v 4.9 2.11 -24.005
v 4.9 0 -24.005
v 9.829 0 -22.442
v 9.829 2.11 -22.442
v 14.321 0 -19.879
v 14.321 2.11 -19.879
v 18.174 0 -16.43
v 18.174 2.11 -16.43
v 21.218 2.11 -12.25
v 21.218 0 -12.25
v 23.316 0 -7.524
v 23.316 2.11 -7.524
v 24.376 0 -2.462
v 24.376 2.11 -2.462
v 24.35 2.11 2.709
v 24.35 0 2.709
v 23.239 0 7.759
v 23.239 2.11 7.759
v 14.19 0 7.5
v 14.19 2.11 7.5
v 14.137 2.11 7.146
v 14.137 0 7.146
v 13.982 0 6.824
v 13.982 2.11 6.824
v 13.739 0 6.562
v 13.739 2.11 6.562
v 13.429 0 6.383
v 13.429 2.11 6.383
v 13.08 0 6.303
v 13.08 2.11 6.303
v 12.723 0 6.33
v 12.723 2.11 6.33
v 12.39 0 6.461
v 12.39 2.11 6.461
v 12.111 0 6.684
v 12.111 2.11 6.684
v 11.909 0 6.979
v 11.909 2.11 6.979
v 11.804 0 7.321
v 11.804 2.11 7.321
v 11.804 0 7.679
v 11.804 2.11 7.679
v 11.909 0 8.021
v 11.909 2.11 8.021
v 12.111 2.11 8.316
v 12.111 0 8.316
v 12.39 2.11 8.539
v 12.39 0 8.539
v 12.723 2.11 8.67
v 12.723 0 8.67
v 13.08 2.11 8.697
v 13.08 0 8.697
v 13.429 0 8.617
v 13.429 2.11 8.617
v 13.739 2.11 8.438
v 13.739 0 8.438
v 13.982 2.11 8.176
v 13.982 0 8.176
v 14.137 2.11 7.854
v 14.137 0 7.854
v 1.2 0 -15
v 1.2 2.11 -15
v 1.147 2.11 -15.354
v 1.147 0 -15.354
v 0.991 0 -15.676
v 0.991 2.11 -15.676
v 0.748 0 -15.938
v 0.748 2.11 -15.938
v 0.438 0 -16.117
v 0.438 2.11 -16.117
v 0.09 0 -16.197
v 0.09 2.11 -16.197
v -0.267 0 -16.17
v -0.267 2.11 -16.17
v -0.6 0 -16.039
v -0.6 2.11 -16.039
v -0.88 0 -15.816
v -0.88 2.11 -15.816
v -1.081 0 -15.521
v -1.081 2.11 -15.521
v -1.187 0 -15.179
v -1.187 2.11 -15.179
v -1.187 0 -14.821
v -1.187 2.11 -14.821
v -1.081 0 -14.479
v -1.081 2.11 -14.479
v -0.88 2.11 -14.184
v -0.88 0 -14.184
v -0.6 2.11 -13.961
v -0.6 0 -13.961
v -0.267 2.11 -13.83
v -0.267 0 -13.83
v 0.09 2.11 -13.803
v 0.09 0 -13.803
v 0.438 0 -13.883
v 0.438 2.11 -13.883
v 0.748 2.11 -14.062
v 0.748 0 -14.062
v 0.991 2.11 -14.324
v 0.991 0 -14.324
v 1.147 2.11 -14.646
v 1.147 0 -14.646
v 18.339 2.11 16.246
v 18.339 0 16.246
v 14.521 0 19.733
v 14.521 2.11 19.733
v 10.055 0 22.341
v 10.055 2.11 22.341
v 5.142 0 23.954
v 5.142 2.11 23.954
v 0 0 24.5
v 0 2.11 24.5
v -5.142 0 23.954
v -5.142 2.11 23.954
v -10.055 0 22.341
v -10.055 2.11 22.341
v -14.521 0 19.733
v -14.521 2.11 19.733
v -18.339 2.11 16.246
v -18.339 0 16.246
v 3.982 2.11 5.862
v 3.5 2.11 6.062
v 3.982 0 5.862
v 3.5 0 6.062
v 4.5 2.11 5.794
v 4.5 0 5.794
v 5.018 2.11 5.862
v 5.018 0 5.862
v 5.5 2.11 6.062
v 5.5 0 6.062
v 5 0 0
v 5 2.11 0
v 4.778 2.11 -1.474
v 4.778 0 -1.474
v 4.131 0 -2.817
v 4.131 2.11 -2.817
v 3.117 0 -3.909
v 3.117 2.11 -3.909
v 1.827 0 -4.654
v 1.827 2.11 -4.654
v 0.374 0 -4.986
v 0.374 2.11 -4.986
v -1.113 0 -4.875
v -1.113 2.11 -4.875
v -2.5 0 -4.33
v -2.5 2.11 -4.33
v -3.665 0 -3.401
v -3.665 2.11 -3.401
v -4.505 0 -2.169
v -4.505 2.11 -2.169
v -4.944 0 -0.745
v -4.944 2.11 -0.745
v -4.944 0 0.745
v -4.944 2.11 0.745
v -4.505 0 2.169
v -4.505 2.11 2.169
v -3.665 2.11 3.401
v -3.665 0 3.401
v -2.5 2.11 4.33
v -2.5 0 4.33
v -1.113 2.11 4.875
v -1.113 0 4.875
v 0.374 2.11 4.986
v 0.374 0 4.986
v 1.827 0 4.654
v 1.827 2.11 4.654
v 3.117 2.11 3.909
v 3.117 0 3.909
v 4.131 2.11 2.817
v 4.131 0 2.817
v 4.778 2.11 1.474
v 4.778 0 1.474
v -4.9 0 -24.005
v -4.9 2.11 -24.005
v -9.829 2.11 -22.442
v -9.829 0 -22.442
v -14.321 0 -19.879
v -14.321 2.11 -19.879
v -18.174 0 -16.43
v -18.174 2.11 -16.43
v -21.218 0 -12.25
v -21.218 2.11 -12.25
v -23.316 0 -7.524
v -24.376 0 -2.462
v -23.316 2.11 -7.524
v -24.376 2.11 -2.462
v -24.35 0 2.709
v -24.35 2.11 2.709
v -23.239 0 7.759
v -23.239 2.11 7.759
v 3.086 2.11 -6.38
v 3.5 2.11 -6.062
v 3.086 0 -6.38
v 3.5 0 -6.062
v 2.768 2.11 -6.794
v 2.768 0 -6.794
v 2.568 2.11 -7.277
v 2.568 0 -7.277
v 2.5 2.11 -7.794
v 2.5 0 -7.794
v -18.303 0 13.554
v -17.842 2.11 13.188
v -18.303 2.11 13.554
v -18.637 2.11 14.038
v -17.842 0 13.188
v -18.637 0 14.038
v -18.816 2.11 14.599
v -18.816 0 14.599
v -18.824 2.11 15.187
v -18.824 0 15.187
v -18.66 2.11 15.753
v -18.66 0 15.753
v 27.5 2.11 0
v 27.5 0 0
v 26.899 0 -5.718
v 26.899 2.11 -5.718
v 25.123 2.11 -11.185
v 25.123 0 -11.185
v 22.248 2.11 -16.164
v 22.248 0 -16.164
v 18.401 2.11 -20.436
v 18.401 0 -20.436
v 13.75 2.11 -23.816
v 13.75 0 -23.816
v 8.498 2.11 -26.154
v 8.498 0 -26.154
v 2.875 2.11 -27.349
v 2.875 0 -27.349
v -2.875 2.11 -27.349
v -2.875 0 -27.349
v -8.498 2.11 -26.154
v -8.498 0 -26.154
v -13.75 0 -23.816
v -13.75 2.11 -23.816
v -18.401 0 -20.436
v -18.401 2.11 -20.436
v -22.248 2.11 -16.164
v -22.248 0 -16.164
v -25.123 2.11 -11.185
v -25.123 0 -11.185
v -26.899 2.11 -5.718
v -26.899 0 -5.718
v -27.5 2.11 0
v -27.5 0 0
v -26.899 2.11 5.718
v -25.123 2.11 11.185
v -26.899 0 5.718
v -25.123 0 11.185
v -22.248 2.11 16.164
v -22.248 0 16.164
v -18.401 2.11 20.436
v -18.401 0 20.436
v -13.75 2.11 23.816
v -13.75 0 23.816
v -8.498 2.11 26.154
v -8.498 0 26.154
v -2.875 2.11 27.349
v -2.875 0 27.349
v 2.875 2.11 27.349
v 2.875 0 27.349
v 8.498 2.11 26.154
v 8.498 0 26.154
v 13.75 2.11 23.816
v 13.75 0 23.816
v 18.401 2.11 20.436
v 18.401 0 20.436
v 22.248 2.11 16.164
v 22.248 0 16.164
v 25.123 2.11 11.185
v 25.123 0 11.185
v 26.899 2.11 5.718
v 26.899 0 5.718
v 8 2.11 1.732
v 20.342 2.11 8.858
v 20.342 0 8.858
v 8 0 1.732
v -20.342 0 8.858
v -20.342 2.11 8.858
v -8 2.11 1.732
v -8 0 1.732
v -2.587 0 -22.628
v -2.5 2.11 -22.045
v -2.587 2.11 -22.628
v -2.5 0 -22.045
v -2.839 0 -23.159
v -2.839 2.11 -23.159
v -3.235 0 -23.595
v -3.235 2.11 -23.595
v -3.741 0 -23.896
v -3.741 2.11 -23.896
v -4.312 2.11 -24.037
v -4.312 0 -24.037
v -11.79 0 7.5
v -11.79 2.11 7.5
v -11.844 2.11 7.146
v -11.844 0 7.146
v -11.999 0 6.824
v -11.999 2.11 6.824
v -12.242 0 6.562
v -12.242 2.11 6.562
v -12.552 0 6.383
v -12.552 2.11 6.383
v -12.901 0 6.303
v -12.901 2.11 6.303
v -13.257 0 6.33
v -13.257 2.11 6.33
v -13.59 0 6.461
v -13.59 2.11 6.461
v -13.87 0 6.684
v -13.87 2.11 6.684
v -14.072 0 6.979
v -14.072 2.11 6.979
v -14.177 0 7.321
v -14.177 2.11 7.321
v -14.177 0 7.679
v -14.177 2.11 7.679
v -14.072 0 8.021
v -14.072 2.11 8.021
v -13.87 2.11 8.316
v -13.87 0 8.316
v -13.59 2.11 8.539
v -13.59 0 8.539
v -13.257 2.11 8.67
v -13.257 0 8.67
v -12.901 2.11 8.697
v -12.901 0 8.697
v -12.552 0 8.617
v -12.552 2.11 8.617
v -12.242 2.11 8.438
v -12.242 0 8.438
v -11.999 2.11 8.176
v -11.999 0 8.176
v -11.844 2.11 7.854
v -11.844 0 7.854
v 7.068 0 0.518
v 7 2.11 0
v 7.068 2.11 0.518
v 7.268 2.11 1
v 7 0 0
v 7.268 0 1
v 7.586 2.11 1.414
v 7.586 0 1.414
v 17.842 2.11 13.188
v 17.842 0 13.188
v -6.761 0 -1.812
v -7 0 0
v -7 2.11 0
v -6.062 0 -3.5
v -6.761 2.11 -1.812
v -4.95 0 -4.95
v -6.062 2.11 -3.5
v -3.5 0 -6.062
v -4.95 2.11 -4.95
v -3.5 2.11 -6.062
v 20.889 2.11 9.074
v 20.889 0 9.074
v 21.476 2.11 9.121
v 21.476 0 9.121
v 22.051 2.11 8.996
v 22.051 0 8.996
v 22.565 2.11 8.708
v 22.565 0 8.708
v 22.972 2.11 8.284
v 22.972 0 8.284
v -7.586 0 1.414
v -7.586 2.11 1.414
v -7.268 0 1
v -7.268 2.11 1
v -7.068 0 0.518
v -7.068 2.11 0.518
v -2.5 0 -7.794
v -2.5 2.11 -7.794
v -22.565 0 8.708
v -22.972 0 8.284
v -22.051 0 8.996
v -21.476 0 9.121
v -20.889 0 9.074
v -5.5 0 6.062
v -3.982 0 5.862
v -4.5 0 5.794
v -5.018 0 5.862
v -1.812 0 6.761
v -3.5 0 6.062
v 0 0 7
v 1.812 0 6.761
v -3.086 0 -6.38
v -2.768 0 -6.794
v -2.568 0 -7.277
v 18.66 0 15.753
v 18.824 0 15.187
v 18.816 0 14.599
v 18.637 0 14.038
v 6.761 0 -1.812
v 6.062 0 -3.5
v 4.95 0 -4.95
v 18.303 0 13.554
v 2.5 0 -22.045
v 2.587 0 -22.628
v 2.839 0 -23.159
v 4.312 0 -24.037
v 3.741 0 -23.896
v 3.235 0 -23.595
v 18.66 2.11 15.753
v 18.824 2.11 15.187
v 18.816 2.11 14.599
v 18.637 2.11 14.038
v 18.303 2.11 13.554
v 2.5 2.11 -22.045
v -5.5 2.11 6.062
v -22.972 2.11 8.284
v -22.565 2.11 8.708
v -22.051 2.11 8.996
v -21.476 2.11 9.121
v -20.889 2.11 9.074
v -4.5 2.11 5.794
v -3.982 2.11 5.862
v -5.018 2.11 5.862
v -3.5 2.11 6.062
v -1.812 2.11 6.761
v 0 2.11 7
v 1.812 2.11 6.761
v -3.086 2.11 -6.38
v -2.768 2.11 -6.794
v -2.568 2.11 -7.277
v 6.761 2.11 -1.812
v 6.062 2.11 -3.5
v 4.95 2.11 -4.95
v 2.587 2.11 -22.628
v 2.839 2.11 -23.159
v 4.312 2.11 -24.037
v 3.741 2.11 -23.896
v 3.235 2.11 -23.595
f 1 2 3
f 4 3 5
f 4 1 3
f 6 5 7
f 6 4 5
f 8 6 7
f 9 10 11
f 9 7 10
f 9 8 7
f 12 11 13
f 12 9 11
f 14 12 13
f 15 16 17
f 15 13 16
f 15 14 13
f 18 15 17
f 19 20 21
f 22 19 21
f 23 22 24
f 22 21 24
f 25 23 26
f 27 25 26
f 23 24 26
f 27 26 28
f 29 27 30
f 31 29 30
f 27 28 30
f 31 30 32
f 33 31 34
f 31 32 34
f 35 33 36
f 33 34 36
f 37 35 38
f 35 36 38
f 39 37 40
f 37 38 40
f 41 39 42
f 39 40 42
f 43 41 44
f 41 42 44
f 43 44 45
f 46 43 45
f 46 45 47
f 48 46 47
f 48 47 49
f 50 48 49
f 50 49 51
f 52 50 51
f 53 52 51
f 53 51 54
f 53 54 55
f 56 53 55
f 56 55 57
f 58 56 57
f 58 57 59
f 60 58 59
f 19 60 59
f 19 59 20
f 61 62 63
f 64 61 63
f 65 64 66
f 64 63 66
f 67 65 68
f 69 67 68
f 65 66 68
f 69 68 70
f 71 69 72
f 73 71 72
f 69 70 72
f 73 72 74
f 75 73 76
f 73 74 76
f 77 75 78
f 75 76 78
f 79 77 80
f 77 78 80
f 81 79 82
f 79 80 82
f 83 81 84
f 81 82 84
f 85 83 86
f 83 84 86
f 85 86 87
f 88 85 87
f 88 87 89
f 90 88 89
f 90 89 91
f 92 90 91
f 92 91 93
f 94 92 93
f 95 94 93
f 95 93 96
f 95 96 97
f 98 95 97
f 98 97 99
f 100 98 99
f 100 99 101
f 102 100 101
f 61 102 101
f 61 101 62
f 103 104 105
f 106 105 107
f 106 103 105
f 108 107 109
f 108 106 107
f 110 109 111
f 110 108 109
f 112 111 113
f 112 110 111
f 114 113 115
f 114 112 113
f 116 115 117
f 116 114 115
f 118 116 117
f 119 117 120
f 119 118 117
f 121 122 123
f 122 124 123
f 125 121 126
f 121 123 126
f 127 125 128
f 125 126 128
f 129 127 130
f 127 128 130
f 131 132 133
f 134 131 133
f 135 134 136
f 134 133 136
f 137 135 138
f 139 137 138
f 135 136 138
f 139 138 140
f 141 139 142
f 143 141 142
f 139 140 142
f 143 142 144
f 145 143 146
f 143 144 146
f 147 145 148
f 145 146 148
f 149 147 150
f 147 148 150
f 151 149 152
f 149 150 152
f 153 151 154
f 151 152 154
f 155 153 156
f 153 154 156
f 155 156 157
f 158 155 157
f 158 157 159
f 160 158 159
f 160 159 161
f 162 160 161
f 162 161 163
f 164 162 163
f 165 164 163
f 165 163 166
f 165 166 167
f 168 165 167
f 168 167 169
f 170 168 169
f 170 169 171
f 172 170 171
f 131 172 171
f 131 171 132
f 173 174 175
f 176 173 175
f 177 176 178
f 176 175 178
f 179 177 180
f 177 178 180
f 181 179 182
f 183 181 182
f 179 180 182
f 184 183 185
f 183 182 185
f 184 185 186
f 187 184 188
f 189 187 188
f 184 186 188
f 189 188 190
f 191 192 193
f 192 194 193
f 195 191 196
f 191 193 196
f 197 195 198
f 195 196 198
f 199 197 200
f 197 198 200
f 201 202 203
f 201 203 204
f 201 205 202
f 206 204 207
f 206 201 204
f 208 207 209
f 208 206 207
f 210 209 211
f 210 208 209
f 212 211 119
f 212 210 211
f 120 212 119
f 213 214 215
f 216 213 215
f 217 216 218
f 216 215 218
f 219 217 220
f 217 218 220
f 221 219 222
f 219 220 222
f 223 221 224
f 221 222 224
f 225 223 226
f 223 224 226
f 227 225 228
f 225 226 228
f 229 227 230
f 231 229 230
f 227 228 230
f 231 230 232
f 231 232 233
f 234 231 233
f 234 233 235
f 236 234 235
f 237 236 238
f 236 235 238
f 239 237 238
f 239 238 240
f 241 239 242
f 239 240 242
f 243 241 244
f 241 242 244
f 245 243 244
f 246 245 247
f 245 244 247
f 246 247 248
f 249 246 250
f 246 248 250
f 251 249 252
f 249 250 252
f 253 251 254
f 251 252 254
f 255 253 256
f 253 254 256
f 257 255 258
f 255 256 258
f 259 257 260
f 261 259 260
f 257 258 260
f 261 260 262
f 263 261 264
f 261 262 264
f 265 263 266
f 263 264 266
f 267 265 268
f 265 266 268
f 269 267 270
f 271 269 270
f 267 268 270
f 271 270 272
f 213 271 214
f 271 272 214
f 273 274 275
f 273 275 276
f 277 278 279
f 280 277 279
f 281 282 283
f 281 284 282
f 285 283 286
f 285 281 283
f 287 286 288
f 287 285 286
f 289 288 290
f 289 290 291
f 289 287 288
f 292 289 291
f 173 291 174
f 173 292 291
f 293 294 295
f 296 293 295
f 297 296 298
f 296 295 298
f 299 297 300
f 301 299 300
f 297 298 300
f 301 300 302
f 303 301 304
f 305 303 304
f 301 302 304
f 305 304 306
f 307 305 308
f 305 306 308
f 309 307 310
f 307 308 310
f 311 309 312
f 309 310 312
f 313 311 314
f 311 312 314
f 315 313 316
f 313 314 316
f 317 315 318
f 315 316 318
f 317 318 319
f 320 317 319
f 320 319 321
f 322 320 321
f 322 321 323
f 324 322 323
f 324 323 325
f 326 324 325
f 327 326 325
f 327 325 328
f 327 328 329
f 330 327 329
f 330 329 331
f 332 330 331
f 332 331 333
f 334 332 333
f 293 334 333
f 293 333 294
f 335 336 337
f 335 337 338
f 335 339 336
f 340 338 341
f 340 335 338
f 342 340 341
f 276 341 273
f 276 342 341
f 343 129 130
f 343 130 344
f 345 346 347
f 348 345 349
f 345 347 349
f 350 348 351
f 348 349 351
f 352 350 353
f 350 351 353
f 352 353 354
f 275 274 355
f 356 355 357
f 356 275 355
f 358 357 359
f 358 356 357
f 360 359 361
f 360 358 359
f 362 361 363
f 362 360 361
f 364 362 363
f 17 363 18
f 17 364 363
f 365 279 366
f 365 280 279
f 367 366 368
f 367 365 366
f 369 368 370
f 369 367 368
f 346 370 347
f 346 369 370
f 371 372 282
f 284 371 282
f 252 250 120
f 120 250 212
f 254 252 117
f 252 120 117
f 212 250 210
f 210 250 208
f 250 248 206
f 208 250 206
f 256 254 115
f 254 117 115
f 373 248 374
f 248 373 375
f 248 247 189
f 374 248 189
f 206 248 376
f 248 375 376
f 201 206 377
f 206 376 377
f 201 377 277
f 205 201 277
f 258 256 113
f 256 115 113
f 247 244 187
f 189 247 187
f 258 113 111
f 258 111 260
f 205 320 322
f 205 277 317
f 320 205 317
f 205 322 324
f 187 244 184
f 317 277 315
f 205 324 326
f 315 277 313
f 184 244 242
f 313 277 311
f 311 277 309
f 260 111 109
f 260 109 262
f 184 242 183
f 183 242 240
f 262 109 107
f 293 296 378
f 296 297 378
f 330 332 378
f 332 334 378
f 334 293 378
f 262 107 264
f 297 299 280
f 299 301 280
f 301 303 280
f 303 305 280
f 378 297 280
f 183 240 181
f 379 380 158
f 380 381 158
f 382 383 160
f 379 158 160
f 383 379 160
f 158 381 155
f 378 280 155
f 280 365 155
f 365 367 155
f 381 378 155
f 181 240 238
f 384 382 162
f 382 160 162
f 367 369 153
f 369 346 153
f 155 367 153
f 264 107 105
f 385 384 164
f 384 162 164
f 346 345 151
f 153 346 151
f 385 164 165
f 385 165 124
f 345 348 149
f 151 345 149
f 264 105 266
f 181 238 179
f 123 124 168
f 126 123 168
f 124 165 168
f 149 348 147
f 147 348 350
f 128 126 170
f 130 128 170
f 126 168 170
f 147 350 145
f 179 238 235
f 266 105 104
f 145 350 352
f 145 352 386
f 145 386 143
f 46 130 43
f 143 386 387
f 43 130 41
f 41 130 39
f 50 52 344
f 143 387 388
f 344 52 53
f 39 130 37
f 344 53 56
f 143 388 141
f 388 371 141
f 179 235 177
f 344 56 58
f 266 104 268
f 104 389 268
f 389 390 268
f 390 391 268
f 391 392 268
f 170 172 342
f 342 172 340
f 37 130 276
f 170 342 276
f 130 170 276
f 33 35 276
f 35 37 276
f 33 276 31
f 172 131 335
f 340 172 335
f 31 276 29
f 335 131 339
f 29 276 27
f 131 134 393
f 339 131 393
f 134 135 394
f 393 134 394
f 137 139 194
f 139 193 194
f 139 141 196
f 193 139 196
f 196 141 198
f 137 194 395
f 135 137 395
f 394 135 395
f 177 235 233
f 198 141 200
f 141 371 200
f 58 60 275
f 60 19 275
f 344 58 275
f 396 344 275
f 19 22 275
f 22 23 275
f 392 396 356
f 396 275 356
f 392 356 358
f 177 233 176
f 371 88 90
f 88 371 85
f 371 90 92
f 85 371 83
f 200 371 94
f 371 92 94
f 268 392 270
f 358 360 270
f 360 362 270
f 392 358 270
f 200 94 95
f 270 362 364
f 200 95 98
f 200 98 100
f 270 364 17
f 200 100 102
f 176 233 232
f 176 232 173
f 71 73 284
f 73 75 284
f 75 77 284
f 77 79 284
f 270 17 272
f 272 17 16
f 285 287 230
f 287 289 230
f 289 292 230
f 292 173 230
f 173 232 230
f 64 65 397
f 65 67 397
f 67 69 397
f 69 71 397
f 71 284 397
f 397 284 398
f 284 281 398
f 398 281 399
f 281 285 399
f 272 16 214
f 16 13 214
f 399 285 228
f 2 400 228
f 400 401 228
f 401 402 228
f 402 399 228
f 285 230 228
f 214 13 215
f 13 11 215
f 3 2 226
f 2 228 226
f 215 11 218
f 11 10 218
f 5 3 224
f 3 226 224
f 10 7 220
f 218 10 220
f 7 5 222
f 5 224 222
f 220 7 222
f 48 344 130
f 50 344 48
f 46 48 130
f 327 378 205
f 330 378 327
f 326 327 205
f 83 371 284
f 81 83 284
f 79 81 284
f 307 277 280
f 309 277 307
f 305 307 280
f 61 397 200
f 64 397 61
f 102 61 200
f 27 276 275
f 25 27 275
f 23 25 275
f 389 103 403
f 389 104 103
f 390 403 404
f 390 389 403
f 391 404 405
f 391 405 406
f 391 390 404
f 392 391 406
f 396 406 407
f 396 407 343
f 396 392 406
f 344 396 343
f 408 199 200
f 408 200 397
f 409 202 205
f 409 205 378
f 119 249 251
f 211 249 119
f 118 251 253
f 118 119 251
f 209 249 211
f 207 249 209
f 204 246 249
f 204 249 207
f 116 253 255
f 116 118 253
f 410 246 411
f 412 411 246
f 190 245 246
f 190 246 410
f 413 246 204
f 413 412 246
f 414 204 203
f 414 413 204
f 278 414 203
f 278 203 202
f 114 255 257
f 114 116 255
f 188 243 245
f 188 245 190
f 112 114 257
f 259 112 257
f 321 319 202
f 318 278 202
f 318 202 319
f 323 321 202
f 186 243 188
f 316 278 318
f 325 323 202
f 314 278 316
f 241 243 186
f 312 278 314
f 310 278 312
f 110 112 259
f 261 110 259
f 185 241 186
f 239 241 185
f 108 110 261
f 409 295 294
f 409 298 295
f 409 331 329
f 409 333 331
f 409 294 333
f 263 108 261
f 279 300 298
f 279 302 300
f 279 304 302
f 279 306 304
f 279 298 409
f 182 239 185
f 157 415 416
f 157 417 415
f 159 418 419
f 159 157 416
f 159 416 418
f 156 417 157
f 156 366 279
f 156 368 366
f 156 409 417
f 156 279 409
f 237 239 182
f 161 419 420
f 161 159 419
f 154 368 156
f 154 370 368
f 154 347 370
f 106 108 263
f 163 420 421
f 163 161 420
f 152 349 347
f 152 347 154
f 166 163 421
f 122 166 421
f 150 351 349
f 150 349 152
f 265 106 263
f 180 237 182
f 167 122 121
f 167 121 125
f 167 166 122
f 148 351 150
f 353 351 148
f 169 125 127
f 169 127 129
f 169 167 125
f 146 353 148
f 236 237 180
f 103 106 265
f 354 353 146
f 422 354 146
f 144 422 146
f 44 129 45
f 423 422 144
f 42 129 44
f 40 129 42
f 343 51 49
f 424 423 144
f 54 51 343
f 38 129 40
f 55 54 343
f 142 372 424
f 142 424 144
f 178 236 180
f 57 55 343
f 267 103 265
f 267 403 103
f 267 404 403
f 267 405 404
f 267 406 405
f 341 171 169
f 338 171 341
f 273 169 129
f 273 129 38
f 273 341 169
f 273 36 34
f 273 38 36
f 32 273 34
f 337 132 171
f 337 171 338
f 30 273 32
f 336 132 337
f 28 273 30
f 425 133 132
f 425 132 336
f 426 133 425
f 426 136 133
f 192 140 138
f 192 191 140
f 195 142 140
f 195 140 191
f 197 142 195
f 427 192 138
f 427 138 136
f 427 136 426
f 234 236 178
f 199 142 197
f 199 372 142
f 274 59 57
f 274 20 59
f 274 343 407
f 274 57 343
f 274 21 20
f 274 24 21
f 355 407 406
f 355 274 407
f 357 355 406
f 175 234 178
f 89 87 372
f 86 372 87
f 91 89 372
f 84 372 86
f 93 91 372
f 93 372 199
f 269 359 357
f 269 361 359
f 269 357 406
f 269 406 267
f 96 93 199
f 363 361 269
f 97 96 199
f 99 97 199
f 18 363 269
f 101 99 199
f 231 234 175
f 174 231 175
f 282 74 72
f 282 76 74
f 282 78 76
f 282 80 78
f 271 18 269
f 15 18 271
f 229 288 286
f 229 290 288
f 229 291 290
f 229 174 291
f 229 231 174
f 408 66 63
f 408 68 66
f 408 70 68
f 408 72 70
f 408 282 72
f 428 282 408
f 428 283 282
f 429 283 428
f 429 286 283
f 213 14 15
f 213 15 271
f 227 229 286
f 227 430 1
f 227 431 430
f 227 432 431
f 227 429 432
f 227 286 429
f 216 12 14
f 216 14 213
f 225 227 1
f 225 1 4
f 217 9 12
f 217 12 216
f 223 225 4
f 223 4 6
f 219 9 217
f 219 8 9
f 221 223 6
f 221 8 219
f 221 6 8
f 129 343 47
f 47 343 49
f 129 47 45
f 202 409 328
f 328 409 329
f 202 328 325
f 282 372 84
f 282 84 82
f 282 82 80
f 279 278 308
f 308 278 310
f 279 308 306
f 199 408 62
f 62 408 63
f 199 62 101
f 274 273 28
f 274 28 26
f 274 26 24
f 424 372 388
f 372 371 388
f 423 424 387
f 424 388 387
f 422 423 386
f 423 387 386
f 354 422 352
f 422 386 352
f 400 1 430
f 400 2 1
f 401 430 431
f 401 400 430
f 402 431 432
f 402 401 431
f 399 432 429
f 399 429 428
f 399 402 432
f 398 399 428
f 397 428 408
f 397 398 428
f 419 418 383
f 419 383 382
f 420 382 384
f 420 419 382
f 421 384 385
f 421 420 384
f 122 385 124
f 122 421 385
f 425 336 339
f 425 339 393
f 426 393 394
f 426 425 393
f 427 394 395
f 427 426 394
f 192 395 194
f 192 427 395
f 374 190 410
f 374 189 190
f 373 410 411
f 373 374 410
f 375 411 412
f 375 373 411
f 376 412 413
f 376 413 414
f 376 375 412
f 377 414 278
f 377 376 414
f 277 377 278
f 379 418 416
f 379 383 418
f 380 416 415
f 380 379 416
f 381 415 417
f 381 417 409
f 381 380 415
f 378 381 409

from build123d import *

# Parameters (mm, degrees)
CROQUIS1_R              = 27.5
SALIENTE_EXTRUIR1_DEPTH = 2.11
CROQUIS2_R              = 1.2
CROQUIS2_R_2            = 5
CORTAR_EXTRUIR1_DEPTH   = 3.11
REDONDEO1_R             = 2


with BuildPart() as part:
    # Croquis1 → Saliente-Extruir1 (new body)
    with BuildSketch(Plane(origin=(0, 0, 0), x_dir=(1, 0, 0), z_dir=(0, 1, 0))):
        Circle(CROQUIS1_R)
    extrude(amount=SALIENTE_EXTRUIR1_DEPTH)

    # Croquis2 → Cortar-Extruir1 (cut, through all)
    with BuildSketch(Plane(origin=(0, 2.11, 0), x_dir=(1, 0, 0), z_dir=(0, 1, 0))):
        with Locations((0, 15)):
            Circle(CROQUIS2_R)
        with Locations((12.990381057, -7.5)):
            Circle(CROQUIS2_R)
        with Locations((-12.990381057, -7.5)):
            Circle(CROQUIS2_R)
        Circle(CROQUIS2_R_2)
        with BuildLine():
            Line((-2.5, 6.538348415), (-2.5, 24.372115214))
            ThreePointArc((-2.5, 24.372115214), (-21.217622393, 12.25), (-22.356870919, -10.020994097))
            Line((-22.356870919, -10.020994097), (-6.912375826, -1.104110698))
            ThreePointArc((-6.912375826, -1.104110698), (-6.062177826, 3.5), (-2.5, 6.538348415))
        make_face()
        with BuildLine():
            Line((2.5, 6.538348415), (2.5, 24.372115214))
            ThreePointArc((2.5, 24.372115214), (21.217622393, 12.25), (22.356870919, -10.020994097))
            Line((22.356870919, -10.020994097), (6.912375826, -1.104110698))
            ThreePointArc((6.912375826, -1.104110698), (6.062177826, 3.5), (2.5, 6.538348415))
        make_face()
        with BuildLine():
            Line((4.412375826, -5.434237717), (19.856870919, -14.351121116))
            ThreePointArc((19.856870919, -14.351121116), (0, -24.5), (-19.856870919, -14.351121116))
            Line((-19.856870919, -14.351121116), (-4.412375826, -5.434237717))
            ThreePointArc((-4.412375826, -5.434237717), (0, -7), (4.412375826, -5.434237717))
        make_face()
    extrude(amount=-CORTAR_EXTRUIR1_DEPTH, mode=Mode.SUBTRACT)

    # Redondeo1
    redondeo1_edges = [part.edges().sort_by_distance(p)[0] for p in [
        (-2.5, 1.055, -6.538348415),
        (-6.912375826, 1.055, 1.104110698),
        (-22.356870919, 1.055, 10.020994097),
        (-2.5, 1.055, -24.372115214),
        (-4.412375826, 1.055, 5.434237717),
        (4.412375826, 1.055, 5.434237717),
        (19.856870919, 1.055, 14.351121116),
        (-19.856870919, 1.055, 14.351121116),
        (6.912375826, 1.055, 1.104110698),
        (2.5, 1.055, -6.538348415),
        (2.5, 1.055, -24.372115214),
        (22.356870919, 1.055, 10.020994097),
    ]]
    fillet(redondeo1_edges, radius=REDONDEO1_R)


solid = part.part
